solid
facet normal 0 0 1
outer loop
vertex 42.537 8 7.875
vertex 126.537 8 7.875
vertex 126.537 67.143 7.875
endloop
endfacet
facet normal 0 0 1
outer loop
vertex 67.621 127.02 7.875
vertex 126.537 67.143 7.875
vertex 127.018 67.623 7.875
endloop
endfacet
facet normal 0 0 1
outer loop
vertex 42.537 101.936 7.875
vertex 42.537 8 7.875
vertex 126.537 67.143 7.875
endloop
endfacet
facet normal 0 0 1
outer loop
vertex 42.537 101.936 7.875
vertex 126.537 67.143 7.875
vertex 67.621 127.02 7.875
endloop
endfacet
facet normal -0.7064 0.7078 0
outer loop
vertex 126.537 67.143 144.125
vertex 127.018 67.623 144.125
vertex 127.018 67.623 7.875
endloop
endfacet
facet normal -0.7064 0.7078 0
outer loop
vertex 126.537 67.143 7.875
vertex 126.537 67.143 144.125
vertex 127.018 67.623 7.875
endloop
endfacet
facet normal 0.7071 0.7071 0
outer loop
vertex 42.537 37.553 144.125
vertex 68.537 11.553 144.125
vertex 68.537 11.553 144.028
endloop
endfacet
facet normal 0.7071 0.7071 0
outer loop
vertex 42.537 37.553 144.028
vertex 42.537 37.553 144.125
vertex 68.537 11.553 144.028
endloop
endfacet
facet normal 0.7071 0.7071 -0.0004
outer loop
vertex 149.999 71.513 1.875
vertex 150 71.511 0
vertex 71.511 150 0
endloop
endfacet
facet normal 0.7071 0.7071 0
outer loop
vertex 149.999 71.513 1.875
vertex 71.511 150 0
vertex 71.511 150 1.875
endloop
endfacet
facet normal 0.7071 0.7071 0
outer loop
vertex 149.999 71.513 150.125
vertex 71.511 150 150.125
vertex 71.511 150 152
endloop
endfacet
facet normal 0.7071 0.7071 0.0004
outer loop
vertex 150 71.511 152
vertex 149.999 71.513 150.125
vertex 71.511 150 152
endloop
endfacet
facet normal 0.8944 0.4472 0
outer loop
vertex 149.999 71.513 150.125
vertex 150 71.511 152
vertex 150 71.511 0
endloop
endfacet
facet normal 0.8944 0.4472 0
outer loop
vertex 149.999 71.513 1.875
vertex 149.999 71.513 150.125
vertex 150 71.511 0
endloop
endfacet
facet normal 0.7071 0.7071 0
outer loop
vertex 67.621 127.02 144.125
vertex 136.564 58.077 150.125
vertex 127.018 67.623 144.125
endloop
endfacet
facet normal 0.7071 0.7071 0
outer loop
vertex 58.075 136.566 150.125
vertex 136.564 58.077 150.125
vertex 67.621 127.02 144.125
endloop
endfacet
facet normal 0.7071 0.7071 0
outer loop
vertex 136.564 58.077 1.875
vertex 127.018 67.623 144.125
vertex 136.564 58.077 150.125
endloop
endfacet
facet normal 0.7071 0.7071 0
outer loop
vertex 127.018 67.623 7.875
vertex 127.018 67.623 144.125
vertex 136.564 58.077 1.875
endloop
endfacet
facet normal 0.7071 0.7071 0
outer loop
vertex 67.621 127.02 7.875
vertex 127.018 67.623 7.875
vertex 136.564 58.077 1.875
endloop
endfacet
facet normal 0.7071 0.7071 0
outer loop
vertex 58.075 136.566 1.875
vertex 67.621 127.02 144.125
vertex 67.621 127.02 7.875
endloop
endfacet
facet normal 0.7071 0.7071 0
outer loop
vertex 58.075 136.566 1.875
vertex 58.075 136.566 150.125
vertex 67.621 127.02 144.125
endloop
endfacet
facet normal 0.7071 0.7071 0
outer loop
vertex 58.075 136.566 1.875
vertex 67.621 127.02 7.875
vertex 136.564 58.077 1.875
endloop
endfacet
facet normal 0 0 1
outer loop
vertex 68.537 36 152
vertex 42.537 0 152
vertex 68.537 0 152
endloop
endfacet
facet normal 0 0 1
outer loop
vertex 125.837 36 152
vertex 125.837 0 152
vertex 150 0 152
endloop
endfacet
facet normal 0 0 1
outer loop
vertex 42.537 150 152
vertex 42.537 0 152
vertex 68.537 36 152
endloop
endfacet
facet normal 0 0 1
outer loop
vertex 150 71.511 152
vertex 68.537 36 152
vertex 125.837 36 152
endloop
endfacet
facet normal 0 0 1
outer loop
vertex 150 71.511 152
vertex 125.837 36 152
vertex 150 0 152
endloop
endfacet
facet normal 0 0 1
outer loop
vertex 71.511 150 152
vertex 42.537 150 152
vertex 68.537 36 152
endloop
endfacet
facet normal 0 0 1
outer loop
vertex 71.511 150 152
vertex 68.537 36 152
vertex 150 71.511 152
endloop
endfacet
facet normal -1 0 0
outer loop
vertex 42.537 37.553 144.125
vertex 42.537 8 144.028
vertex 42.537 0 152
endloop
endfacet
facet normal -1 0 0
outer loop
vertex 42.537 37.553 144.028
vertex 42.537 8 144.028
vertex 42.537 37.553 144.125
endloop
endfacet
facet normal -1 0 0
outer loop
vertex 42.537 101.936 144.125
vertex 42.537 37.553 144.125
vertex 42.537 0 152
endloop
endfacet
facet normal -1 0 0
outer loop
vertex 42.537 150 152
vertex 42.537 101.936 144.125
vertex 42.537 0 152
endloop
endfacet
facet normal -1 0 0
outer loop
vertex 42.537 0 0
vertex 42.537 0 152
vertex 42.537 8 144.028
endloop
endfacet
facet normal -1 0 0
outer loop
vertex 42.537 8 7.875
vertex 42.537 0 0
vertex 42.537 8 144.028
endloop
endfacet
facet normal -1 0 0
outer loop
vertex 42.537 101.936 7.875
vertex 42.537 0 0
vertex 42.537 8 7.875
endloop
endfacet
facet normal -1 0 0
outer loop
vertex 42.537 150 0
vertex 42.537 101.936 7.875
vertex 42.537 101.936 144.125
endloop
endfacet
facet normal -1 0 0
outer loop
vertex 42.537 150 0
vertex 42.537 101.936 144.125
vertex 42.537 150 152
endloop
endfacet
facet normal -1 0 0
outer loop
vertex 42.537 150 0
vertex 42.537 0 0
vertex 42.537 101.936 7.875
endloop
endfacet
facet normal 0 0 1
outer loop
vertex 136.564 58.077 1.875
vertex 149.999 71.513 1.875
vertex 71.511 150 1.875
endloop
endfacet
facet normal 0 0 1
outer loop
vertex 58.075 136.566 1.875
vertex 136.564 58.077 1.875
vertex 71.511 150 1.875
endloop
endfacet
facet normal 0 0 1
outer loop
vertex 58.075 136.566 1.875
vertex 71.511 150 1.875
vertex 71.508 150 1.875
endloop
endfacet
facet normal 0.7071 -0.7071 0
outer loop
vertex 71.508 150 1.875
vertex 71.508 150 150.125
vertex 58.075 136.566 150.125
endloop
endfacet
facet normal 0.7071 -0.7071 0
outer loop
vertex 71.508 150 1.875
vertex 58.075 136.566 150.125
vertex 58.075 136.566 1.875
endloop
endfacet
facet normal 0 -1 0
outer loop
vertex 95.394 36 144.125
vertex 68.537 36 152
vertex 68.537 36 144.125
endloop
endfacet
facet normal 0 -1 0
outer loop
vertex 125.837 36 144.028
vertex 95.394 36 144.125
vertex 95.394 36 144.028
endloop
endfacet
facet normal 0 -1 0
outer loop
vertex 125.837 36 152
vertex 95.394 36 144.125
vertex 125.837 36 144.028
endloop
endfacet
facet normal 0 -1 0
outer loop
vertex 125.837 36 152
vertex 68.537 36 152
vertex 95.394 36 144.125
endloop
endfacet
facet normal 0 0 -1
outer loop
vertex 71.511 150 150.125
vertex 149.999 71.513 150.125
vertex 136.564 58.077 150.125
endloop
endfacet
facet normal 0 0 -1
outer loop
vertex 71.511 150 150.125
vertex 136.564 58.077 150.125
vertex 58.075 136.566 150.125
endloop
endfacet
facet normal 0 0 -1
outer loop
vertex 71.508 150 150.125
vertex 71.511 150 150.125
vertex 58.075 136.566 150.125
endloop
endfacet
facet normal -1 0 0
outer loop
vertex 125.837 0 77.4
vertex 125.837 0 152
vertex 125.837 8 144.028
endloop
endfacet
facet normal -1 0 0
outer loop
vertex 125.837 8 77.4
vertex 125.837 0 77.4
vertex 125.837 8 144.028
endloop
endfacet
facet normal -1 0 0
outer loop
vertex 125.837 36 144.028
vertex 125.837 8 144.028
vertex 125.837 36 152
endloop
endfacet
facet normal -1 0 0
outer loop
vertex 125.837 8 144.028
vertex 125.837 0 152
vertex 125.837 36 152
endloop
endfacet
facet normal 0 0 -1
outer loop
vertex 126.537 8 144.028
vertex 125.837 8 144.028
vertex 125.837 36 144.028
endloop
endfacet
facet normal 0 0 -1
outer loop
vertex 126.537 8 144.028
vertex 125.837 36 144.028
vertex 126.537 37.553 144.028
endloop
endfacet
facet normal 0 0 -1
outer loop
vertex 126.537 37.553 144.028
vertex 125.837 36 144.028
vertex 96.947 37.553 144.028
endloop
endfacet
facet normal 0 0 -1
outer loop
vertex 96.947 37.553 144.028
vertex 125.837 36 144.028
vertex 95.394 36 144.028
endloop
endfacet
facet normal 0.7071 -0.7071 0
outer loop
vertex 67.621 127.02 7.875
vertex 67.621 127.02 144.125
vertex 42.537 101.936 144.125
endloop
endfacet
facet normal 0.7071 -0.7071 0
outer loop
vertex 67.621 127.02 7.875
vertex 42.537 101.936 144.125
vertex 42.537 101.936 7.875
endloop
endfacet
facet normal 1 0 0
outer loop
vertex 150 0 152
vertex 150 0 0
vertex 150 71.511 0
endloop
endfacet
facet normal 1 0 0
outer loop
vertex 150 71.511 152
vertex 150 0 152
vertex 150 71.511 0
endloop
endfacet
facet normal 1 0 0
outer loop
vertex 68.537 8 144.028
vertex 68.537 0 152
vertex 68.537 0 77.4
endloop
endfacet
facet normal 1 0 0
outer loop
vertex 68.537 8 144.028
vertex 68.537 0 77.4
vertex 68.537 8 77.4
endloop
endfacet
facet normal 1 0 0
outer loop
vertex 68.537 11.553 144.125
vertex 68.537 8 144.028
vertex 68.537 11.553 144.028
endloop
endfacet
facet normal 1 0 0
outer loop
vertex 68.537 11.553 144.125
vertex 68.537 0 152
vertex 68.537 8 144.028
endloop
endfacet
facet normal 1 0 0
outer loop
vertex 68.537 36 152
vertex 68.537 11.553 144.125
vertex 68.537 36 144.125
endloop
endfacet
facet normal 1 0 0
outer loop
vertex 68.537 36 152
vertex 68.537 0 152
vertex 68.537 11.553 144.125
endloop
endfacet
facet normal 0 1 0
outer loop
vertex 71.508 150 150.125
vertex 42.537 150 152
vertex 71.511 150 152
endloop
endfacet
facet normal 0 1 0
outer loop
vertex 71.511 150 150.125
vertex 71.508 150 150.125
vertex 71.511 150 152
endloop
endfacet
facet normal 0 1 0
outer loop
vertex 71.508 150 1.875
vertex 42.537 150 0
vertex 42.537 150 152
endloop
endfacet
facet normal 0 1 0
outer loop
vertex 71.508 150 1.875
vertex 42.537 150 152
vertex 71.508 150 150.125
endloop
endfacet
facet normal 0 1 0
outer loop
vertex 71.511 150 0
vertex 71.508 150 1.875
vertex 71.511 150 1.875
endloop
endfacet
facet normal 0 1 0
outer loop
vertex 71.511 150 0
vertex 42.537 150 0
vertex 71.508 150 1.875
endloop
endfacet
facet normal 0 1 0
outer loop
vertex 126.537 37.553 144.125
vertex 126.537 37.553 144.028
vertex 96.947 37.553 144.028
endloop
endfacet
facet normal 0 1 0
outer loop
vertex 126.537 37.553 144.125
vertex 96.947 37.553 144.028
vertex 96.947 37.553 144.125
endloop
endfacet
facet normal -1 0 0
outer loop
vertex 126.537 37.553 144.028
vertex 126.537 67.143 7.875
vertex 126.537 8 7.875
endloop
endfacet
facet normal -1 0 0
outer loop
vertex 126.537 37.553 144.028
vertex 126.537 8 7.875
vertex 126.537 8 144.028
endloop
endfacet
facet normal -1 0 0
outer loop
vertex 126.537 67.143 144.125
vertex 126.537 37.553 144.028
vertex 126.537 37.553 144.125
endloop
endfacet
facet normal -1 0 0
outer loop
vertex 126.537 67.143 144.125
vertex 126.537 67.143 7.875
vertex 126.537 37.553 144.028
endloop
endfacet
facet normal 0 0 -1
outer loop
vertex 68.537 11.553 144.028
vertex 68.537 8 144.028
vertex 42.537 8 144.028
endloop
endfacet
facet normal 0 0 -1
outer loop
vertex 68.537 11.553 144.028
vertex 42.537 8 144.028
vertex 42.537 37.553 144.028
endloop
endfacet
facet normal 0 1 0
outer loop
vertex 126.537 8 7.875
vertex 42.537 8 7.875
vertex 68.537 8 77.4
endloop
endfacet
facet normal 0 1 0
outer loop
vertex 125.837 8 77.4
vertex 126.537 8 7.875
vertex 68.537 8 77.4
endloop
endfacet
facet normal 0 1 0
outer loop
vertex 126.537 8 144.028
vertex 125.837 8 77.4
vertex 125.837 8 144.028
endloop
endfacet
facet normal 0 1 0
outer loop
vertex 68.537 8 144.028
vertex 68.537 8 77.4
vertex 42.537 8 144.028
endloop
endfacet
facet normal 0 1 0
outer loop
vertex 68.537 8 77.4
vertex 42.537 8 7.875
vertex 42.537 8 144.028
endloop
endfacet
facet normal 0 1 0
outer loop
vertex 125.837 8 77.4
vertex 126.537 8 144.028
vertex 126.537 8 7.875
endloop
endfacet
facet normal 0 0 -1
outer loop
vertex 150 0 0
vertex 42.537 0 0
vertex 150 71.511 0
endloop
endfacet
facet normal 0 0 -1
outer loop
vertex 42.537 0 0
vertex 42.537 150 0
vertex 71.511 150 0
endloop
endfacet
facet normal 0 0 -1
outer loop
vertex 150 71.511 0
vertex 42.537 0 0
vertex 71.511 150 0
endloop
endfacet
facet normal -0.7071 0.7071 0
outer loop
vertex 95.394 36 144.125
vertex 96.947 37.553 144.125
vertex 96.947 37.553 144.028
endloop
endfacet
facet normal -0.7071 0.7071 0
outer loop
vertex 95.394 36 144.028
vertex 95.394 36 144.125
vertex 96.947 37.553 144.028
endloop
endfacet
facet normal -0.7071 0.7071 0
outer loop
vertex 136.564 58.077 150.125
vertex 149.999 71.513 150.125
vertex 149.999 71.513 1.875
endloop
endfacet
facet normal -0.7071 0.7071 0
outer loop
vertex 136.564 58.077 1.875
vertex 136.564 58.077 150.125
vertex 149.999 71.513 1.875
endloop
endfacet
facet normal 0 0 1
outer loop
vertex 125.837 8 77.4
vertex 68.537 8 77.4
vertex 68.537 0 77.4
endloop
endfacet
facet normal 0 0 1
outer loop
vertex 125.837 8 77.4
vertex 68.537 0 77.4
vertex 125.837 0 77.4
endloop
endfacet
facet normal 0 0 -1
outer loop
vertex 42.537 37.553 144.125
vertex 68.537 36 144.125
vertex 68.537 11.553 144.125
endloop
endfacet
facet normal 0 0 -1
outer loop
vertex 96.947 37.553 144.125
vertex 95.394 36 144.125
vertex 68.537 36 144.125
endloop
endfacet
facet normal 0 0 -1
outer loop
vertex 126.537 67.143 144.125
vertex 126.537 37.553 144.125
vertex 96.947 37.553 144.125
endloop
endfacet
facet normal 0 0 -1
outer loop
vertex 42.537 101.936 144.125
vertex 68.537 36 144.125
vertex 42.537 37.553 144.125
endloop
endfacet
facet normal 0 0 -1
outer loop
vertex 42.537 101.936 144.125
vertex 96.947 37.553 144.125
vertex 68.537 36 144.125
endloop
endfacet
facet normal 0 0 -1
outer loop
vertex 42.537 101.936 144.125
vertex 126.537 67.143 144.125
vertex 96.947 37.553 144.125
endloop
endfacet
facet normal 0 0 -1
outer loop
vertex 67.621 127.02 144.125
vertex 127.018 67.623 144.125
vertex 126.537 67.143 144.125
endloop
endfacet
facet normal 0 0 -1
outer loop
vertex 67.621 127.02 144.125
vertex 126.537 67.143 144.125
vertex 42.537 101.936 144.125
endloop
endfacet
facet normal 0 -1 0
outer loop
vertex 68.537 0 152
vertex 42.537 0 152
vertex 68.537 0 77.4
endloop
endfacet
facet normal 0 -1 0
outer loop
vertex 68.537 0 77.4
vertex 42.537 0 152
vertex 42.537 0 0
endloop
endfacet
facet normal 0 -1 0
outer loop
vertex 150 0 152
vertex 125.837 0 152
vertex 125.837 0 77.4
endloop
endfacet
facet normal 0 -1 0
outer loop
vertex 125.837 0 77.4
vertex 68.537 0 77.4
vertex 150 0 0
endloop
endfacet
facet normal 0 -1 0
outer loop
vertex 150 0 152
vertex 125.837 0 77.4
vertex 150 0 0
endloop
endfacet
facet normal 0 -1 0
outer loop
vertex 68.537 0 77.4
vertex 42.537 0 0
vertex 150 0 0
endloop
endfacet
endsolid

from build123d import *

# Parameters (mm, degrees)
SKETCH1_W               = 150
SKETCH1_H               = 150
BOSS_EXTRUDE2_DEPTH     = 152
CHAMFER1_SIZE           = 78.48885271
SKETCH4_W               = 148.25
SKETCH4_H               = 111
CUT_EXTRUDE5_DEPTH      = 19
SKETCH5_W               = 136.25
SKETCH5_H               = 84
CUT_EXTRUDE6_DEPTH      = 81
CUT_EXTRUDE7_DEPTH      = 20
CUT_EXTRUDE7_DEPTH_BACK = 153
SKETCH6_W               = 42.53672634
SKETCH6_H               = 150
SKETCH7_W               = 136.153133976
SKETCH7_H               = 29.553064713
CUT_EXTRUDE8_DEPTH      = 84
SKETCH8_W               = 136.25
SKETCH8_H               = 30.070372941
CUT_EXTRUDE9_DEPTH      = 30
SKETCH9_W               = 57.3
SKETCH9_H               = 36
CUT_EXTRUDE10_DEPTH     = 74.6


with BuildPart() as part:
    # Sketch1 → Boss-Extrude2 (new body)
    with BuildSketch(Plane.XY):
        with Locations((75, 75)):
            Rectangle(SKETCH1_W, SKETCH1_H)
    extrude(amount=BOSS_EXTRUDE2_DEPTH)

    # Chamfer1
    chamfer1_edges = [part.edges().sort_by_distance(p)[0] for p in [
        (150, 150, 76),
    ]]
    chamfer(chamfer1_edges, length=CHAMFER1_SIZE)

    # Sketch4 → Cut-Extrude5 (cut)
    with BuildSketch(Plane(origin=(110.755573645, 110.755573645, 0), x_dir=(0, 0, -1), z_dir=(0.7071067811865489, 0.7071067811865461, 0))):
        with Locations((-76, 0.001948307)):
            Rectangle(SKETCH4_W, SKETCH4_H)
    extrude(amount=-CUT_EXTRUDE5_DEPTH, mode=Mode.SUBTRACT)

    # Sketch5 → Cut-Extrude6 (cut)
    with BuildSketch(Plane(origin=(97.320544802, 97.320544802, 0), x_dir=(0, 0, -1), z_dir=(0.707106781186549, 0.707106781186546, 0))):
        with Locations((-76, 0.001948307)):
            Rectangle(SKETCH5_W, SKETCH5_H)
    extrude(amount=-CUT_EXTRUDE6_DEPTH, mode=Mode.SUBTRACT)

    # Sketch6 → Cut-Extrude7 (cut, two sides: drawn at the far end of the back side and taken through both)
    with BuildSketch(Plane.XY.offset(152).offset(-CUT_EXTRUDE7_DEPTH_BACK)):
        with Locations((21.26836317, 75)):
            Rectangle(SKETCH6_W, SKETCH6_H)
    extrude(amount=CUT_EXTRUDE7_DEPTH + CUT_EXTRUDE7_DEPTH_BACK, mode=Mode.SUBTRACT)

    # Sketch7 → Cut-Extrude8 (cut)
    with BuildSketch(Plane.ZY.offset(-42.53672634)):
        with Locations((75.951566988, 22.776532357)):
            Rectangle(SKETCH7_W, SKETCH7_H)
    extrude(amount=-CUT_EXTRUDE8_DEPTH, mode=Mode.SUBTRACT)

    # Sketch8 → Cut-Extrude9 (cut)
    with BuildSketch(Plane.ZY.offset(-126.53672634)):
        with Locations((76, 52.588251184)):
            Rectangle(SKETCH8_W, SKETCH8_H)
    extrude(amount=CUT_EXTRUDE9_DEPTH, mode=Mode.SUBTRACT)

    # Sketch9 → Cut-Extrude10 (cut)
    with BuildSketch(Plane.XY.offset(152)):
        with Locations((97.18672634, 18)):
            Rectangle(SKETCH9_W, SKETCH9_H)
    extrude(amount=-CUT_EXTRUDE10_DEPTH, mode=Mode.SUBTRACT)


solid = part.part
